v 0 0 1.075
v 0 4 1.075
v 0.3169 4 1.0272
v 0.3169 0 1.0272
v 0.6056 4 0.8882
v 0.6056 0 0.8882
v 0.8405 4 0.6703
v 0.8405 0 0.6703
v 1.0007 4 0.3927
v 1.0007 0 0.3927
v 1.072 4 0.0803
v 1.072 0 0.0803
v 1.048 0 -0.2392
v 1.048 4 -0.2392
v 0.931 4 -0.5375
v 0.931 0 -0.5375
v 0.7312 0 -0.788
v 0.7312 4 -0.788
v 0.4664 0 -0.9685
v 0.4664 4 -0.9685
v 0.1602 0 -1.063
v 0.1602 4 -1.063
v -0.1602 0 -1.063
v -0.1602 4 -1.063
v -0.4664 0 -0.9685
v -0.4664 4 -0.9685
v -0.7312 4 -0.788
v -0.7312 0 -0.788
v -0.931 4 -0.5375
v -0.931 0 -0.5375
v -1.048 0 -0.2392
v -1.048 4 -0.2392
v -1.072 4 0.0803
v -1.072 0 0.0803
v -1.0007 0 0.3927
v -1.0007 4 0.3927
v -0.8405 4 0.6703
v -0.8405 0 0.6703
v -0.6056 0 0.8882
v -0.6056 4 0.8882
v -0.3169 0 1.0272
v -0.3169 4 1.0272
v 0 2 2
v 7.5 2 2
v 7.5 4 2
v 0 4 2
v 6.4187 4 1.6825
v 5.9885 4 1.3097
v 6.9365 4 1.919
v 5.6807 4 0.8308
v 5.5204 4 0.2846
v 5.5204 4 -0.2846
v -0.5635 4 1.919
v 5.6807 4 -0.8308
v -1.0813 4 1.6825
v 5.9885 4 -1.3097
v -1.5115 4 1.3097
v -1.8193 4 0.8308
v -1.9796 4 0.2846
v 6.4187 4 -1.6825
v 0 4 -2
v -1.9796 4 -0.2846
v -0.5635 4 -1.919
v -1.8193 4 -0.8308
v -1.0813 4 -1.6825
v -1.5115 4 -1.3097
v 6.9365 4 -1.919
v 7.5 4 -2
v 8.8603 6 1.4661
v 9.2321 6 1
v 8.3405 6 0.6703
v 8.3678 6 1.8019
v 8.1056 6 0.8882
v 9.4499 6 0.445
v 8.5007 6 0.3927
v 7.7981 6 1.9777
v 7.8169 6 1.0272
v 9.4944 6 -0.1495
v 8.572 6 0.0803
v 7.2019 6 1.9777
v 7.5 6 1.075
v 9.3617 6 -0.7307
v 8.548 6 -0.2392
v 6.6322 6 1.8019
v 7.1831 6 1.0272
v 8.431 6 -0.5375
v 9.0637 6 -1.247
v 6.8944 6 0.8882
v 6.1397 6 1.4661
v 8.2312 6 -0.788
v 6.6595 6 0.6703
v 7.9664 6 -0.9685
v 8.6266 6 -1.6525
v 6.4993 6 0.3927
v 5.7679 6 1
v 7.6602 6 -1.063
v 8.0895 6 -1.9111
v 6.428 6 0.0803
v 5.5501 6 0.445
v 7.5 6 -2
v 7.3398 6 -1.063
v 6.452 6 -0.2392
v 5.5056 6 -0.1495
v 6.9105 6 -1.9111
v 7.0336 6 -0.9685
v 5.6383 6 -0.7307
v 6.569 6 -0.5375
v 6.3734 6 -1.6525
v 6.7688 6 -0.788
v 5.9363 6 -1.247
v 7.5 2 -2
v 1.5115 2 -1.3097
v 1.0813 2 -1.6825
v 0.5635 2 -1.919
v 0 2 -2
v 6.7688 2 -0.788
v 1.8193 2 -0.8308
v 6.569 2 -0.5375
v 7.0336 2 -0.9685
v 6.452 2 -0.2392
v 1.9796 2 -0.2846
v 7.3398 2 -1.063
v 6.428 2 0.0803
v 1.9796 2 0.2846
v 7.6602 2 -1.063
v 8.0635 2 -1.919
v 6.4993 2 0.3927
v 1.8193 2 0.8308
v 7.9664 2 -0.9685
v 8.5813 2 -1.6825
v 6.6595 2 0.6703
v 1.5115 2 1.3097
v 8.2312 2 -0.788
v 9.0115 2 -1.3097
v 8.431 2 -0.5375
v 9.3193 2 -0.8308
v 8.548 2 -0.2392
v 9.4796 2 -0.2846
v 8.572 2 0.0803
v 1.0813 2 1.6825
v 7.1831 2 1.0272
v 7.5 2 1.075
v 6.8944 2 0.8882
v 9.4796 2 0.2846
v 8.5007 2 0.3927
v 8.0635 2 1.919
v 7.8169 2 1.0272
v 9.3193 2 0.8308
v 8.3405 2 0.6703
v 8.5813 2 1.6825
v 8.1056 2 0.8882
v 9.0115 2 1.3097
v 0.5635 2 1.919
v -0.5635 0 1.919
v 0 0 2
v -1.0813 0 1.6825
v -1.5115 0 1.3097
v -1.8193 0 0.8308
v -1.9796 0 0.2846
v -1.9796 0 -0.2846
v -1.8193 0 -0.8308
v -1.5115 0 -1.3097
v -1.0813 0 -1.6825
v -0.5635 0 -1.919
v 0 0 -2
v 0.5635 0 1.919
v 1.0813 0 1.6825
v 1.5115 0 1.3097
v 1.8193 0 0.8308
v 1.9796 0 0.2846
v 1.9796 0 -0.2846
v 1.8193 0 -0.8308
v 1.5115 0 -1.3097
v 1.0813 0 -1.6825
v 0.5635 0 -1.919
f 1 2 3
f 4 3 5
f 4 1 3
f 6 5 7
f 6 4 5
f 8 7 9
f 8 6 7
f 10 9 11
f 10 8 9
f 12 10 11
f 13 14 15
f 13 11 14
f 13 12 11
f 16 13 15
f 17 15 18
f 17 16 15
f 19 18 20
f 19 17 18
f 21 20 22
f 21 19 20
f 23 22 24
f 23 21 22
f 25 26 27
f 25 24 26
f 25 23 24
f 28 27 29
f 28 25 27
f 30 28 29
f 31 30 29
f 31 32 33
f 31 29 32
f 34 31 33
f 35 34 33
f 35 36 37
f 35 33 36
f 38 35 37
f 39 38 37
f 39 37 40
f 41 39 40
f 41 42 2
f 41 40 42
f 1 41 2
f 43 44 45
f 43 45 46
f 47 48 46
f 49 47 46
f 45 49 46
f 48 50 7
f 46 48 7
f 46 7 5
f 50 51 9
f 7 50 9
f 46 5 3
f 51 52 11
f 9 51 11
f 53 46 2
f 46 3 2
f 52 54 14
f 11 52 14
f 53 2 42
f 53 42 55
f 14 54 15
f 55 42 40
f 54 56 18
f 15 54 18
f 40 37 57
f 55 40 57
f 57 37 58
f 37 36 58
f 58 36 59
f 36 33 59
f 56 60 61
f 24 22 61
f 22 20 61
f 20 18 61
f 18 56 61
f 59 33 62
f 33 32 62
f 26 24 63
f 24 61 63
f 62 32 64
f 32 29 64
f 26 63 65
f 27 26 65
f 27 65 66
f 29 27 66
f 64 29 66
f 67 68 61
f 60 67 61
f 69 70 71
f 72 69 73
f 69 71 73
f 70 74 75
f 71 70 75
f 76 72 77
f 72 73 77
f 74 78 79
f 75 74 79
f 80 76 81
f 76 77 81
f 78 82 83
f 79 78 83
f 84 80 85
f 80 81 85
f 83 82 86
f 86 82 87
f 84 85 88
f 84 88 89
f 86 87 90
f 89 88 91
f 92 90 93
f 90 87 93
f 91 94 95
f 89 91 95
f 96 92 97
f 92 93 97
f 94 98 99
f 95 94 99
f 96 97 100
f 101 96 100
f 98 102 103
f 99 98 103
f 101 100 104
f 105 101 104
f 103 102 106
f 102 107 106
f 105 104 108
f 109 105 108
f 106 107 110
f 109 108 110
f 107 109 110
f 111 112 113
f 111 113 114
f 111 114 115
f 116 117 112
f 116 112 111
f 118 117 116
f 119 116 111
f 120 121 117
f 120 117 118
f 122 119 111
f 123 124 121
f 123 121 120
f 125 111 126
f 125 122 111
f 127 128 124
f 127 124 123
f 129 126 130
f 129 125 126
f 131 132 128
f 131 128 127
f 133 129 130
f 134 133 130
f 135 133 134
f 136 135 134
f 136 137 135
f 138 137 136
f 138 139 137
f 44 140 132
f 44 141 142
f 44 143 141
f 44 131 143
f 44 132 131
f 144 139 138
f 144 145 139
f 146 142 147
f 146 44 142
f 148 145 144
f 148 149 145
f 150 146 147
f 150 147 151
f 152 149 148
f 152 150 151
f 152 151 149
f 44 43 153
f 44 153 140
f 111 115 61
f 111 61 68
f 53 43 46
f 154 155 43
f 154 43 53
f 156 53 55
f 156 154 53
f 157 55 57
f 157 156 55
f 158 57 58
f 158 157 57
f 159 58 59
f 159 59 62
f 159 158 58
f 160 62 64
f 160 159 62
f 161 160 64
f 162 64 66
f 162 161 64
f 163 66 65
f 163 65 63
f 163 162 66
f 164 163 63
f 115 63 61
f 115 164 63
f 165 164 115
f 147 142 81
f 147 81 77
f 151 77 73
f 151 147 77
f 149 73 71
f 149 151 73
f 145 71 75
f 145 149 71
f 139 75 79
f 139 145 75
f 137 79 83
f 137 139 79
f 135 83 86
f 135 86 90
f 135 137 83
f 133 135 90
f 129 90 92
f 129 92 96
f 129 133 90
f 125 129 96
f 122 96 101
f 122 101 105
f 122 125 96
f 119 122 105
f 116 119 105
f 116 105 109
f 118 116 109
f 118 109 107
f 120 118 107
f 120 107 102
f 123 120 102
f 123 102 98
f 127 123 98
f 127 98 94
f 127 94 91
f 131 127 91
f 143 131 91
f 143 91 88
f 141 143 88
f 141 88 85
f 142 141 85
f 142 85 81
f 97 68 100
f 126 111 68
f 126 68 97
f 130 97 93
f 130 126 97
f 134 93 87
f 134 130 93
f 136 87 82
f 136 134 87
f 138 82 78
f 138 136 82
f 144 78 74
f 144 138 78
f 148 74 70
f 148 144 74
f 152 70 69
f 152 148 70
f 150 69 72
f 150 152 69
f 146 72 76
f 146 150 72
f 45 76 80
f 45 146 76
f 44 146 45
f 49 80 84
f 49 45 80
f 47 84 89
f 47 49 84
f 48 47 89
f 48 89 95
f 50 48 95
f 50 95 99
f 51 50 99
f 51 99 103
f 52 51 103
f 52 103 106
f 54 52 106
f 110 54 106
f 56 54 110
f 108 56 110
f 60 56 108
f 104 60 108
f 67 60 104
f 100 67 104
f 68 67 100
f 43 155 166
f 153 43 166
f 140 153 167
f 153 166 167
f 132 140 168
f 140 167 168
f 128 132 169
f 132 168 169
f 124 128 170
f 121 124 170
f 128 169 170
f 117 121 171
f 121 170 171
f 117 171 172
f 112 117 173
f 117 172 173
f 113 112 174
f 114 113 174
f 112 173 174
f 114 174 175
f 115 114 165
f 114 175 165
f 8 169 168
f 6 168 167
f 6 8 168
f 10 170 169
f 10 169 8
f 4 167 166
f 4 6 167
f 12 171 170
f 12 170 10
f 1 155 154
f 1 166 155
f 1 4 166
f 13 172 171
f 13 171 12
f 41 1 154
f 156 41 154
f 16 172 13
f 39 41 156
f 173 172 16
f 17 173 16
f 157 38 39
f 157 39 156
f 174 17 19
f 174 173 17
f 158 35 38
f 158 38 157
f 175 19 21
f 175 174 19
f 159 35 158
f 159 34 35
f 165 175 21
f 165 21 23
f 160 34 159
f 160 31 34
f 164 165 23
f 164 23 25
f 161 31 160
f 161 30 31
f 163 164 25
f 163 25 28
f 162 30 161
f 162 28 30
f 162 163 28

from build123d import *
from build123d.topology import SkipClean

# Parameters (mm, degrees)
SKETCH1_R           = 1.075
BOSS_EXTRUDE1_DEPTH = 6
CUT_EXTRUDE1_START  = -2
CUT_EXTRUDE1_DEPTH  = 2
CUT_EXTRUDE2_DEPTH  = 2


with BuildPart() as part:
    # Sketch1 → Boss-Extrude1 (new body)
    with BuildSketch(Plane(origin=(0, 0, 0), x_dir=(1, 0, 0), z_dir=(0, 1, 0))):
        with BuildLine():
            Line((0, 2), (7.5, 2))
            ThreePointArc((7.5, 2), (9.5, 0), (7.5, -2))
            Line((7.5, -2), (0, -2))
            ThreePointArc((0, -2), (-2, 0), (0, 2))
        make_face()
        with Locations(Location((0, 0, 0), (0, 0, 270))):
            Circle(SKETCH1_R, mode=Mode.SUBTRACT)
        with Locations(Location((7.5, 0, 0), (0, 0, 270))):
            Circle(SKETCH1_R, mode=Mode.SUBTRACT)
    extrude(amount=BOSS_EXTRUDE1_DEPTH)

    # Sketch2 → Cut-Extrude1 (cut)
    with BuildSketch(Plane(origin=(0, 6, 0), x_dir=(1, 0, 0), z_dir=(0, 1, 0)).offset(CUT_EXTRUDE1_START)):
        with BuildLine():
            Line((0, 2), (7.5, 2))
            ThreePointArc((7.5, 2), (5.5, 0), (7.5, -2))
            Line((7.5, -2), (0, -2))
            ThreePointArc((0, -2), (-2, 0), (0, 2))
        make_face()
    extrude(amount=CUT_EXTRUDE1_DEPTH, mode=Mode.SUBTRACT)

    # Sketch3 → Cut-Extrude2 (cut)
    with SkipClean():  # the faces are left unmerged after this step: merging them gives an invalid solid
        with BuildSketch(Plane.XZ):
            with BuildLine():
                Line((7.5, 2), (0, 2))
                ThreePointArc((0, 2), (2, 0), (0, -2))
                Line((0, -2), (7.5, -2))
                ThreePointArc((7.5, -2), (9.5, 0), (7.5, 2))
            make_face()
        extrude(amount=-CUT_EXTRUDE2_DEPTH, mode=Mode.SUBTRACT)


solid = part.part
